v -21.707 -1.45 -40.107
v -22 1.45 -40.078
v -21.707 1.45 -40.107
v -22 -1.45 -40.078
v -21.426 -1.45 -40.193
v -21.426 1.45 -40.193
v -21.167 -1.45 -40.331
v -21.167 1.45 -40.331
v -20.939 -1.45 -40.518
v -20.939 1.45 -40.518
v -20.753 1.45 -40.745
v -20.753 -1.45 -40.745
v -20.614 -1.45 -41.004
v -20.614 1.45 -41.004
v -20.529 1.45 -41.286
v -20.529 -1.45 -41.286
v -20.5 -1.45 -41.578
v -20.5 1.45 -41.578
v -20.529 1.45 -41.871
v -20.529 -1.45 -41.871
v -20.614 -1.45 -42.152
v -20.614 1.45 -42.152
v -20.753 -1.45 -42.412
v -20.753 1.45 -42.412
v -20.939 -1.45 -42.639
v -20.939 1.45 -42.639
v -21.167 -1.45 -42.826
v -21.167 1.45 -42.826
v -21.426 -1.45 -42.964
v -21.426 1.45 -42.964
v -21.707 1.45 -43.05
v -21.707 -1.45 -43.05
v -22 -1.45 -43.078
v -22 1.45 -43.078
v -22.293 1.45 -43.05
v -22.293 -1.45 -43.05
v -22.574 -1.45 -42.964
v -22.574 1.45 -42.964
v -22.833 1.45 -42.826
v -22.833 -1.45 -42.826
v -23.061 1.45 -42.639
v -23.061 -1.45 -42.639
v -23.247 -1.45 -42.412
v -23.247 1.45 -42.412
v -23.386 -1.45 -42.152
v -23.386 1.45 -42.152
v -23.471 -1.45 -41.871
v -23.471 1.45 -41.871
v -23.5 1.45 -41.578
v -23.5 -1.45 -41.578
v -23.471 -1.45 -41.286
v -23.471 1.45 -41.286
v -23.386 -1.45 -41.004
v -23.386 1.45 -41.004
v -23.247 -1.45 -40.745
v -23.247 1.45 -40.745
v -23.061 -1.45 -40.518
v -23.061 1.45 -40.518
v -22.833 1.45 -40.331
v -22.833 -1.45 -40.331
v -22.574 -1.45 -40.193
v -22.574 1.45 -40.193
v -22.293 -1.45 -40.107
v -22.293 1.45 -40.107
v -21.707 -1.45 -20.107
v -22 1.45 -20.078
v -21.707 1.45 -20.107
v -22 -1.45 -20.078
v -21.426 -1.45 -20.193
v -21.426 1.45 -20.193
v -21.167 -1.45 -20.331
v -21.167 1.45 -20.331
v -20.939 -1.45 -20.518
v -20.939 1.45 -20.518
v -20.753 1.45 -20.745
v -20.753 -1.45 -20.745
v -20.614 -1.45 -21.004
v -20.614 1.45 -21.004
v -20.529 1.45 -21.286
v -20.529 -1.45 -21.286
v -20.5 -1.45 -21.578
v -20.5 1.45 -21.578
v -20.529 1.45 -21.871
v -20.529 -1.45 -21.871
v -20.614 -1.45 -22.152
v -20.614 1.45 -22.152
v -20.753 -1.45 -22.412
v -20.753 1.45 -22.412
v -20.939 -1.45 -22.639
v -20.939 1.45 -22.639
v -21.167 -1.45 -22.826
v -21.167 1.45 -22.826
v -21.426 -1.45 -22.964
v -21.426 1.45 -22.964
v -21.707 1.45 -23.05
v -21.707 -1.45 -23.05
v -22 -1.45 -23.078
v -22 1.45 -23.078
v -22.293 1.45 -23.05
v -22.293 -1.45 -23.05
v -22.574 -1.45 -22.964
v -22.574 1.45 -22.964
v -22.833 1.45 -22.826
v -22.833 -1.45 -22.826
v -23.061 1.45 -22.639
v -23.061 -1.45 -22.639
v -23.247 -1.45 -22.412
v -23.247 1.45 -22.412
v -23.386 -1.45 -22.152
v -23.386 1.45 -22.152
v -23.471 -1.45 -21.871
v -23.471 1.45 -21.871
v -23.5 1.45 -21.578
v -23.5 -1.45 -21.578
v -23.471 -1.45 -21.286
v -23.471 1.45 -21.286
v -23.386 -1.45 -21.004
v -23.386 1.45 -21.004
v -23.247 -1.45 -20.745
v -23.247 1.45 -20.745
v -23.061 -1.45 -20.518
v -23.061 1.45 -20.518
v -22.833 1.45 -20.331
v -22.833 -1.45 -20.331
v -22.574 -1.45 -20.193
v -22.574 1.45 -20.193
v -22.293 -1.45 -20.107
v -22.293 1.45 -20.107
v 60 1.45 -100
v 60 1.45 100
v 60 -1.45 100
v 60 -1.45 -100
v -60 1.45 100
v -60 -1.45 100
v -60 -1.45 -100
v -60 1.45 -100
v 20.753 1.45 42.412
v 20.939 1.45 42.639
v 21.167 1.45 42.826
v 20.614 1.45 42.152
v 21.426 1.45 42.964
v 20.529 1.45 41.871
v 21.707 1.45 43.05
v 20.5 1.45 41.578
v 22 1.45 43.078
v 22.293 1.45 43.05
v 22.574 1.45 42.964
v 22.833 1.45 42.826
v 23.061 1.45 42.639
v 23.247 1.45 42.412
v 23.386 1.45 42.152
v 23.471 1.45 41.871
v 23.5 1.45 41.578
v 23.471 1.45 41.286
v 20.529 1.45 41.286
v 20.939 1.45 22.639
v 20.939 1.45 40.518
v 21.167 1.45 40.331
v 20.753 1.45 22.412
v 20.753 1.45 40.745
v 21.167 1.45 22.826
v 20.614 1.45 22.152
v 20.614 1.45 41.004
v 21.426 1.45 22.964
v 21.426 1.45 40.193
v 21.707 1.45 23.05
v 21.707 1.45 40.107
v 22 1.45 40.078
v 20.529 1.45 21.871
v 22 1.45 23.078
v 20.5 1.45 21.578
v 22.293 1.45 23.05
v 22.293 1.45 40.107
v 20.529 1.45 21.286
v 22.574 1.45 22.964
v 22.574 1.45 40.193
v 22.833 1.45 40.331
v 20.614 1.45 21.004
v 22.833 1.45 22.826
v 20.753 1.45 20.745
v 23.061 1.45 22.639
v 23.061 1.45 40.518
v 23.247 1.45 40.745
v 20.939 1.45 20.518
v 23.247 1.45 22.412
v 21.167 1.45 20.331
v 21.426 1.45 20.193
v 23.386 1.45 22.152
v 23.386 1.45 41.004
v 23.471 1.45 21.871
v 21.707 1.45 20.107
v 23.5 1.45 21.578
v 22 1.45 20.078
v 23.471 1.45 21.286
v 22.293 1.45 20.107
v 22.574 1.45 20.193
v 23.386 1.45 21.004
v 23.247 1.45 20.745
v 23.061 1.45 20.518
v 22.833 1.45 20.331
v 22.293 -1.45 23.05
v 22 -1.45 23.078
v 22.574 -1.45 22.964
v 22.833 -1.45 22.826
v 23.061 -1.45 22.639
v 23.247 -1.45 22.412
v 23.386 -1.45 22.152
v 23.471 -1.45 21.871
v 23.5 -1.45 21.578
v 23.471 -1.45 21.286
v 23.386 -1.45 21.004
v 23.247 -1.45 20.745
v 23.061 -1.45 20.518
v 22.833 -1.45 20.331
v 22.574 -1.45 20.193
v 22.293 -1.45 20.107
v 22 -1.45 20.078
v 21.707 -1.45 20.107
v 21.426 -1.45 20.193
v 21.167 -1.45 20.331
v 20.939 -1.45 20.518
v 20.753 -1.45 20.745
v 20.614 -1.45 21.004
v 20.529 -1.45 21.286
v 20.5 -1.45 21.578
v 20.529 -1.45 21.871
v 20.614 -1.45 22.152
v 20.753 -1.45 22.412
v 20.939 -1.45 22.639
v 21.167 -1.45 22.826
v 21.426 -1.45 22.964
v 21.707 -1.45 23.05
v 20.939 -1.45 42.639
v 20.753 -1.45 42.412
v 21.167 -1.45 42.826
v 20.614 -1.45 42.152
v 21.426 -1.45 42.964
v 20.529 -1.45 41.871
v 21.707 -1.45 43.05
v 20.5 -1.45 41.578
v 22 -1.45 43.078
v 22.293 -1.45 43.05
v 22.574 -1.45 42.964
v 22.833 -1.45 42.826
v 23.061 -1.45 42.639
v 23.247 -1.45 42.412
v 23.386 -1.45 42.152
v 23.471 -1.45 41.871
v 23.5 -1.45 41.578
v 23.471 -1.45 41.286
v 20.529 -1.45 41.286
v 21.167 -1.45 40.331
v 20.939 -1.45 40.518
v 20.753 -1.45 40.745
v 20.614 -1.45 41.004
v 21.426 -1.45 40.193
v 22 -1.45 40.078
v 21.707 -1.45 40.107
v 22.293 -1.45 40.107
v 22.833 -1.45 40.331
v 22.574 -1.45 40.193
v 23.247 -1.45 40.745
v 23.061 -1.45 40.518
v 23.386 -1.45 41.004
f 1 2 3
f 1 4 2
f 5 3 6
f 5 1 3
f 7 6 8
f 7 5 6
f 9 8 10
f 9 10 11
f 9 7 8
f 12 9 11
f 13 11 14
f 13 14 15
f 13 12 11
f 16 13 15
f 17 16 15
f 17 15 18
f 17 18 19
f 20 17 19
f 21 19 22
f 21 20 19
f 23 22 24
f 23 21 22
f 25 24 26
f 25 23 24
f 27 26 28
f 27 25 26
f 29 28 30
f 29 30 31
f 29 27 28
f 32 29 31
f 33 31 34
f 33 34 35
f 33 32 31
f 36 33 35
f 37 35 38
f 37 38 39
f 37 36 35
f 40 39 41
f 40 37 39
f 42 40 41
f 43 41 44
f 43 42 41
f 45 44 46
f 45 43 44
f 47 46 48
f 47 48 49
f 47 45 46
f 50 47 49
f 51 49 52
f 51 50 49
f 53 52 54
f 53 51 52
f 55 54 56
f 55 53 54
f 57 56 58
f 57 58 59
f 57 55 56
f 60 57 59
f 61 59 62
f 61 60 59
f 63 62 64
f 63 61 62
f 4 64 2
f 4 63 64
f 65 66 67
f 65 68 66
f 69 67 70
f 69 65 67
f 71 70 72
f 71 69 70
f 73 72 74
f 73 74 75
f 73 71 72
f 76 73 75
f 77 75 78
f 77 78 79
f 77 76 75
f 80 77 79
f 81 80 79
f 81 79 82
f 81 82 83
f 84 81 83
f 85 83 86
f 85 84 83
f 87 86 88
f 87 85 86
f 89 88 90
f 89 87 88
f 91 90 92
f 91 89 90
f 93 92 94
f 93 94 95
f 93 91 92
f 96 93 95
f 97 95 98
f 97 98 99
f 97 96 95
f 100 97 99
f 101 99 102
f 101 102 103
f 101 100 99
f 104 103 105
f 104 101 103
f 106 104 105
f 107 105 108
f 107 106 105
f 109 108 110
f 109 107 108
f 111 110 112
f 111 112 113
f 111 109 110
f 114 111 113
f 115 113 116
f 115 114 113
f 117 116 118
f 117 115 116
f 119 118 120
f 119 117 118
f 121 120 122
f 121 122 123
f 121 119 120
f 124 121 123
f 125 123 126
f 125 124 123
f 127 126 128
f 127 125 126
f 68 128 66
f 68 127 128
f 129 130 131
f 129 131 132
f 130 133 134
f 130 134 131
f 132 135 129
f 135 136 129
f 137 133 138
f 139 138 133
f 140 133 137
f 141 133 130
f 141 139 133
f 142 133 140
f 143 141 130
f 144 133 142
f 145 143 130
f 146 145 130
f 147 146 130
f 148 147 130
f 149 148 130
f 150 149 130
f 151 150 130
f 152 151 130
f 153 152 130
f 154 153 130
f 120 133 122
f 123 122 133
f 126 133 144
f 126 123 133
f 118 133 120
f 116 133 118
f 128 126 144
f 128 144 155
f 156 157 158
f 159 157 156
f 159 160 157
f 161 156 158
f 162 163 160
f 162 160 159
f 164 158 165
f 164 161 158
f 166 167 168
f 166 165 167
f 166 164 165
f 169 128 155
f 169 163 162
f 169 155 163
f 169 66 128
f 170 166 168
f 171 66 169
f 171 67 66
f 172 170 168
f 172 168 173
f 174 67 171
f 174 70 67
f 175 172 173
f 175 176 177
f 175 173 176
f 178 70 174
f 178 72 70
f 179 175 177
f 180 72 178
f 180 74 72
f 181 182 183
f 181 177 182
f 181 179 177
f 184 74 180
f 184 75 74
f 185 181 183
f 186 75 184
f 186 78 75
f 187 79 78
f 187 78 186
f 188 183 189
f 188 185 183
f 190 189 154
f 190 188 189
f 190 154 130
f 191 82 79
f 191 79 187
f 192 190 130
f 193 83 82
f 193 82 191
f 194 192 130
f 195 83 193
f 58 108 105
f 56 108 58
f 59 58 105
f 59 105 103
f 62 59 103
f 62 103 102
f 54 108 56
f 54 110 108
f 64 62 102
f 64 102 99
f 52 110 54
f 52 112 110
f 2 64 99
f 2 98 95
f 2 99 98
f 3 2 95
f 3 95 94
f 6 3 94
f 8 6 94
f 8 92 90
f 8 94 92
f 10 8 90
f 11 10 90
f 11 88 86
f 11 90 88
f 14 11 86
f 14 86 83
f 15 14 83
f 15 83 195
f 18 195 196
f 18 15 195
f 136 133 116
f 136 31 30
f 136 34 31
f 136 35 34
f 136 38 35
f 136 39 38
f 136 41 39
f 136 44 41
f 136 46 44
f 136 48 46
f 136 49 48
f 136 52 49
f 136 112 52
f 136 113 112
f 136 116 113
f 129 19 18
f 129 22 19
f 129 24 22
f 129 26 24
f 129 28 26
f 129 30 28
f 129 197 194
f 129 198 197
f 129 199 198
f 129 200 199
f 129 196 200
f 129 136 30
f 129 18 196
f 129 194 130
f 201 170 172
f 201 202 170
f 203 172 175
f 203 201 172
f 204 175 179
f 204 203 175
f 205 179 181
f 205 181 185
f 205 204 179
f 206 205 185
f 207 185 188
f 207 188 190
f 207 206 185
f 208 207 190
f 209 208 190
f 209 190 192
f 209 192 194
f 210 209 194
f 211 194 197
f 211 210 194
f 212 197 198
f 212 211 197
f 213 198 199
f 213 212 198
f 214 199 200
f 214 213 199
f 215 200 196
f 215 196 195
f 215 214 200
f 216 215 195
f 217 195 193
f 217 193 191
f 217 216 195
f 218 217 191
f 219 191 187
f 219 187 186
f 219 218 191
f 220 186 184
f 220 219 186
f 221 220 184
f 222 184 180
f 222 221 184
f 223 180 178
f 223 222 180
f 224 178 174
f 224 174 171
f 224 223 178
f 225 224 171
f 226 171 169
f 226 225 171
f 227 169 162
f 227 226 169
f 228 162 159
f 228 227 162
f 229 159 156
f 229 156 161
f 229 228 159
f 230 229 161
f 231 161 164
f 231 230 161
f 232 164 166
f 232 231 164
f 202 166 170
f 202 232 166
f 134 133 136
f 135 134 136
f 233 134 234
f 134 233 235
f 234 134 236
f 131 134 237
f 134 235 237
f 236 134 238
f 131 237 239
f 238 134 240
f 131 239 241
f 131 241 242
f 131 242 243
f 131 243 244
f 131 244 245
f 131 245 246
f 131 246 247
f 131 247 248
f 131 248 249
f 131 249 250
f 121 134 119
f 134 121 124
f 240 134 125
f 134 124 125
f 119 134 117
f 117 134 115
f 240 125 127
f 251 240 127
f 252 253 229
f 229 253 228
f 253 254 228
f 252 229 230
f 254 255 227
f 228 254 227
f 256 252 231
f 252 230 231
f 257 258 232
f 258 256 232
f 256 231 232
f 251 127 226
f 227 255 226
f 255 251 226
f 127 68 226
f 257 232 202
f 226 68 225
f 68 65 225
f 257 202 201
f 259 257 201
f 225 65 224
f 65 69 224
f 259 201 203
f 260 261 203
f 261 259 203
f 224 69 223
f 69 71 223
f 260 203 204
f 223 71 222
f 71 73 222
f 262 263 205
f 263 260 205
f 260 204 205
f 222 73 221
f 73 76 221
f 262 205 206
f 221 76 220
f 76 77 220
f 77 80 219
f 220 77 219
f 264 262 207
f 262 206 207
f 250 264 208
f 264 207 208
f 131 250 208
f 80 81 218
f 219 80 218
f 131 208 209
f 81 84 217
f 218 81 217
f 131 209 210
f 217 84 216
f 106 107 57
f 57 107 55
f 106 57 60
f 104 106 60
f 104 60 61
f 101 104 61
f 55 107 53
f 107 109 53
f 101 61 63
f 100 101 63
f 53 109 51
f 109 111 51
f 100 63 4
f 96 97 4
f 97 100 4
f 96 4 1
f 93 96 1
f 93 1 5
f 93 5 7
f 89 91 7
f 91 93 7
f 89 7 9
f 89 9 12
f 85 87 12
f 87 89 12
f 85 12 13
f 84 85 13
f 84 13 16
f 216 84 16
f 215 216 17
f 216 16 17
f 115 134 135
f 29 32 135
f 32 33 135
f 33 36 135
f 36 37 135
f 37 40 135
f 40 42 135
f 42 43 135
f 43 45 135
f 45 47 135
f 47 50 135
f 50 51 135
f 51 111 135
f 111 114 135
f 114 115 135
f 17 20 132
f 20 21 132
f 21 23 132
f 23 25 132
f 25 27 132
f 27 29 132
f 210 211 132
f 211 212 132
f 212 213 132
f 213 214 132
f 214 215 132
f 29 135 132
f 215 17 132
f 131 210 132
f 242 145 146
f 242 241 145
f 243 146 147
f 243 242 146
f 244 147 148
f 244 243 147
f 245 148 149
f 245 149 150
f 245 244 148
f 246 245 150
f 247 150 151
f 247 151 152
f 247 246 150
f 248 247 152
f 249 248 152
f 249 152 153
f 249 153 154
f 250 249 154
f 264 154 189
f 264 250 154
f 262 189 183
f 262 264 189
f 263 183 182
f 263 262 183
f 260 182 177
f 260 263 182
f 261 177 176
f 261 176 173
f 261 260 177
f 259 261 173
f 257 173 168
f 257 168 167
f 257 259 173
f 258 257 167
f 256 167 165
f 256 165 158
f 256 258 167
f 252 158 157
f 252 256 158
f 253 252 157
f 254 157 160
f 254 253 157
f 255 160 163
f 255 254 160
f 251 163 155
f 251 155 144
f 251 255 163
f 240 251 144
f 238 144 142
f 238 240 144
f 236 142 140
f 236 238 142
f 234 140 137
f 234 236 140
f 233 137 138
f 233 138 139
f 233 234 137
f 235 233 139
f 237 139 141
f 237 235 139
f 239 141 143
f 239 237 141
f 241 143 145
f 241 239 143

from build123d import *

# Parameters (mm, degrees)
SKETCH1_W           = 120
SKETCH1_H           = 200
SKETCH1_R           = 1.5
BOSS_EXTRUDE1_DEPTH = 1.45


with BuildPart() as part:
    # Sketch1 → Boss-Extrude1 (new, symmetric)
    with BuildSketch(Plane(origin=(0, 0, 0), x_dir=(1, 0, 0), z_dir=(0, 1, 0))):
        Rectangle(SKETCH1_W, SKETCH1_H)
        with Locations(Location((-22, 41.578386207, 0), (0, 0, 270))):
            Circle(SKETCH1_R, mode=Mode.SUBTRACT)
        with Locations(Location((-22, 21.578386207, 0), (0, 0, 270))):
            Circle(SKETCH1_R, mode=Mode.SUBTRACT)
        with Locations(Location((22, -21.578386207, 0), (0, 0, 270))):
            Circle(SKETCH1_R, mode=Mode.SUBTRACT)
        with Locations(Location((22, -41.578386207, 0), (0, 0, 270))):
            Circle(SKETCH1_R, mode=Mode.SUBTRACT)
    extrude(amount=BOSS_EXTRUDE1_DEPTH, both=True)


solid = part.part
